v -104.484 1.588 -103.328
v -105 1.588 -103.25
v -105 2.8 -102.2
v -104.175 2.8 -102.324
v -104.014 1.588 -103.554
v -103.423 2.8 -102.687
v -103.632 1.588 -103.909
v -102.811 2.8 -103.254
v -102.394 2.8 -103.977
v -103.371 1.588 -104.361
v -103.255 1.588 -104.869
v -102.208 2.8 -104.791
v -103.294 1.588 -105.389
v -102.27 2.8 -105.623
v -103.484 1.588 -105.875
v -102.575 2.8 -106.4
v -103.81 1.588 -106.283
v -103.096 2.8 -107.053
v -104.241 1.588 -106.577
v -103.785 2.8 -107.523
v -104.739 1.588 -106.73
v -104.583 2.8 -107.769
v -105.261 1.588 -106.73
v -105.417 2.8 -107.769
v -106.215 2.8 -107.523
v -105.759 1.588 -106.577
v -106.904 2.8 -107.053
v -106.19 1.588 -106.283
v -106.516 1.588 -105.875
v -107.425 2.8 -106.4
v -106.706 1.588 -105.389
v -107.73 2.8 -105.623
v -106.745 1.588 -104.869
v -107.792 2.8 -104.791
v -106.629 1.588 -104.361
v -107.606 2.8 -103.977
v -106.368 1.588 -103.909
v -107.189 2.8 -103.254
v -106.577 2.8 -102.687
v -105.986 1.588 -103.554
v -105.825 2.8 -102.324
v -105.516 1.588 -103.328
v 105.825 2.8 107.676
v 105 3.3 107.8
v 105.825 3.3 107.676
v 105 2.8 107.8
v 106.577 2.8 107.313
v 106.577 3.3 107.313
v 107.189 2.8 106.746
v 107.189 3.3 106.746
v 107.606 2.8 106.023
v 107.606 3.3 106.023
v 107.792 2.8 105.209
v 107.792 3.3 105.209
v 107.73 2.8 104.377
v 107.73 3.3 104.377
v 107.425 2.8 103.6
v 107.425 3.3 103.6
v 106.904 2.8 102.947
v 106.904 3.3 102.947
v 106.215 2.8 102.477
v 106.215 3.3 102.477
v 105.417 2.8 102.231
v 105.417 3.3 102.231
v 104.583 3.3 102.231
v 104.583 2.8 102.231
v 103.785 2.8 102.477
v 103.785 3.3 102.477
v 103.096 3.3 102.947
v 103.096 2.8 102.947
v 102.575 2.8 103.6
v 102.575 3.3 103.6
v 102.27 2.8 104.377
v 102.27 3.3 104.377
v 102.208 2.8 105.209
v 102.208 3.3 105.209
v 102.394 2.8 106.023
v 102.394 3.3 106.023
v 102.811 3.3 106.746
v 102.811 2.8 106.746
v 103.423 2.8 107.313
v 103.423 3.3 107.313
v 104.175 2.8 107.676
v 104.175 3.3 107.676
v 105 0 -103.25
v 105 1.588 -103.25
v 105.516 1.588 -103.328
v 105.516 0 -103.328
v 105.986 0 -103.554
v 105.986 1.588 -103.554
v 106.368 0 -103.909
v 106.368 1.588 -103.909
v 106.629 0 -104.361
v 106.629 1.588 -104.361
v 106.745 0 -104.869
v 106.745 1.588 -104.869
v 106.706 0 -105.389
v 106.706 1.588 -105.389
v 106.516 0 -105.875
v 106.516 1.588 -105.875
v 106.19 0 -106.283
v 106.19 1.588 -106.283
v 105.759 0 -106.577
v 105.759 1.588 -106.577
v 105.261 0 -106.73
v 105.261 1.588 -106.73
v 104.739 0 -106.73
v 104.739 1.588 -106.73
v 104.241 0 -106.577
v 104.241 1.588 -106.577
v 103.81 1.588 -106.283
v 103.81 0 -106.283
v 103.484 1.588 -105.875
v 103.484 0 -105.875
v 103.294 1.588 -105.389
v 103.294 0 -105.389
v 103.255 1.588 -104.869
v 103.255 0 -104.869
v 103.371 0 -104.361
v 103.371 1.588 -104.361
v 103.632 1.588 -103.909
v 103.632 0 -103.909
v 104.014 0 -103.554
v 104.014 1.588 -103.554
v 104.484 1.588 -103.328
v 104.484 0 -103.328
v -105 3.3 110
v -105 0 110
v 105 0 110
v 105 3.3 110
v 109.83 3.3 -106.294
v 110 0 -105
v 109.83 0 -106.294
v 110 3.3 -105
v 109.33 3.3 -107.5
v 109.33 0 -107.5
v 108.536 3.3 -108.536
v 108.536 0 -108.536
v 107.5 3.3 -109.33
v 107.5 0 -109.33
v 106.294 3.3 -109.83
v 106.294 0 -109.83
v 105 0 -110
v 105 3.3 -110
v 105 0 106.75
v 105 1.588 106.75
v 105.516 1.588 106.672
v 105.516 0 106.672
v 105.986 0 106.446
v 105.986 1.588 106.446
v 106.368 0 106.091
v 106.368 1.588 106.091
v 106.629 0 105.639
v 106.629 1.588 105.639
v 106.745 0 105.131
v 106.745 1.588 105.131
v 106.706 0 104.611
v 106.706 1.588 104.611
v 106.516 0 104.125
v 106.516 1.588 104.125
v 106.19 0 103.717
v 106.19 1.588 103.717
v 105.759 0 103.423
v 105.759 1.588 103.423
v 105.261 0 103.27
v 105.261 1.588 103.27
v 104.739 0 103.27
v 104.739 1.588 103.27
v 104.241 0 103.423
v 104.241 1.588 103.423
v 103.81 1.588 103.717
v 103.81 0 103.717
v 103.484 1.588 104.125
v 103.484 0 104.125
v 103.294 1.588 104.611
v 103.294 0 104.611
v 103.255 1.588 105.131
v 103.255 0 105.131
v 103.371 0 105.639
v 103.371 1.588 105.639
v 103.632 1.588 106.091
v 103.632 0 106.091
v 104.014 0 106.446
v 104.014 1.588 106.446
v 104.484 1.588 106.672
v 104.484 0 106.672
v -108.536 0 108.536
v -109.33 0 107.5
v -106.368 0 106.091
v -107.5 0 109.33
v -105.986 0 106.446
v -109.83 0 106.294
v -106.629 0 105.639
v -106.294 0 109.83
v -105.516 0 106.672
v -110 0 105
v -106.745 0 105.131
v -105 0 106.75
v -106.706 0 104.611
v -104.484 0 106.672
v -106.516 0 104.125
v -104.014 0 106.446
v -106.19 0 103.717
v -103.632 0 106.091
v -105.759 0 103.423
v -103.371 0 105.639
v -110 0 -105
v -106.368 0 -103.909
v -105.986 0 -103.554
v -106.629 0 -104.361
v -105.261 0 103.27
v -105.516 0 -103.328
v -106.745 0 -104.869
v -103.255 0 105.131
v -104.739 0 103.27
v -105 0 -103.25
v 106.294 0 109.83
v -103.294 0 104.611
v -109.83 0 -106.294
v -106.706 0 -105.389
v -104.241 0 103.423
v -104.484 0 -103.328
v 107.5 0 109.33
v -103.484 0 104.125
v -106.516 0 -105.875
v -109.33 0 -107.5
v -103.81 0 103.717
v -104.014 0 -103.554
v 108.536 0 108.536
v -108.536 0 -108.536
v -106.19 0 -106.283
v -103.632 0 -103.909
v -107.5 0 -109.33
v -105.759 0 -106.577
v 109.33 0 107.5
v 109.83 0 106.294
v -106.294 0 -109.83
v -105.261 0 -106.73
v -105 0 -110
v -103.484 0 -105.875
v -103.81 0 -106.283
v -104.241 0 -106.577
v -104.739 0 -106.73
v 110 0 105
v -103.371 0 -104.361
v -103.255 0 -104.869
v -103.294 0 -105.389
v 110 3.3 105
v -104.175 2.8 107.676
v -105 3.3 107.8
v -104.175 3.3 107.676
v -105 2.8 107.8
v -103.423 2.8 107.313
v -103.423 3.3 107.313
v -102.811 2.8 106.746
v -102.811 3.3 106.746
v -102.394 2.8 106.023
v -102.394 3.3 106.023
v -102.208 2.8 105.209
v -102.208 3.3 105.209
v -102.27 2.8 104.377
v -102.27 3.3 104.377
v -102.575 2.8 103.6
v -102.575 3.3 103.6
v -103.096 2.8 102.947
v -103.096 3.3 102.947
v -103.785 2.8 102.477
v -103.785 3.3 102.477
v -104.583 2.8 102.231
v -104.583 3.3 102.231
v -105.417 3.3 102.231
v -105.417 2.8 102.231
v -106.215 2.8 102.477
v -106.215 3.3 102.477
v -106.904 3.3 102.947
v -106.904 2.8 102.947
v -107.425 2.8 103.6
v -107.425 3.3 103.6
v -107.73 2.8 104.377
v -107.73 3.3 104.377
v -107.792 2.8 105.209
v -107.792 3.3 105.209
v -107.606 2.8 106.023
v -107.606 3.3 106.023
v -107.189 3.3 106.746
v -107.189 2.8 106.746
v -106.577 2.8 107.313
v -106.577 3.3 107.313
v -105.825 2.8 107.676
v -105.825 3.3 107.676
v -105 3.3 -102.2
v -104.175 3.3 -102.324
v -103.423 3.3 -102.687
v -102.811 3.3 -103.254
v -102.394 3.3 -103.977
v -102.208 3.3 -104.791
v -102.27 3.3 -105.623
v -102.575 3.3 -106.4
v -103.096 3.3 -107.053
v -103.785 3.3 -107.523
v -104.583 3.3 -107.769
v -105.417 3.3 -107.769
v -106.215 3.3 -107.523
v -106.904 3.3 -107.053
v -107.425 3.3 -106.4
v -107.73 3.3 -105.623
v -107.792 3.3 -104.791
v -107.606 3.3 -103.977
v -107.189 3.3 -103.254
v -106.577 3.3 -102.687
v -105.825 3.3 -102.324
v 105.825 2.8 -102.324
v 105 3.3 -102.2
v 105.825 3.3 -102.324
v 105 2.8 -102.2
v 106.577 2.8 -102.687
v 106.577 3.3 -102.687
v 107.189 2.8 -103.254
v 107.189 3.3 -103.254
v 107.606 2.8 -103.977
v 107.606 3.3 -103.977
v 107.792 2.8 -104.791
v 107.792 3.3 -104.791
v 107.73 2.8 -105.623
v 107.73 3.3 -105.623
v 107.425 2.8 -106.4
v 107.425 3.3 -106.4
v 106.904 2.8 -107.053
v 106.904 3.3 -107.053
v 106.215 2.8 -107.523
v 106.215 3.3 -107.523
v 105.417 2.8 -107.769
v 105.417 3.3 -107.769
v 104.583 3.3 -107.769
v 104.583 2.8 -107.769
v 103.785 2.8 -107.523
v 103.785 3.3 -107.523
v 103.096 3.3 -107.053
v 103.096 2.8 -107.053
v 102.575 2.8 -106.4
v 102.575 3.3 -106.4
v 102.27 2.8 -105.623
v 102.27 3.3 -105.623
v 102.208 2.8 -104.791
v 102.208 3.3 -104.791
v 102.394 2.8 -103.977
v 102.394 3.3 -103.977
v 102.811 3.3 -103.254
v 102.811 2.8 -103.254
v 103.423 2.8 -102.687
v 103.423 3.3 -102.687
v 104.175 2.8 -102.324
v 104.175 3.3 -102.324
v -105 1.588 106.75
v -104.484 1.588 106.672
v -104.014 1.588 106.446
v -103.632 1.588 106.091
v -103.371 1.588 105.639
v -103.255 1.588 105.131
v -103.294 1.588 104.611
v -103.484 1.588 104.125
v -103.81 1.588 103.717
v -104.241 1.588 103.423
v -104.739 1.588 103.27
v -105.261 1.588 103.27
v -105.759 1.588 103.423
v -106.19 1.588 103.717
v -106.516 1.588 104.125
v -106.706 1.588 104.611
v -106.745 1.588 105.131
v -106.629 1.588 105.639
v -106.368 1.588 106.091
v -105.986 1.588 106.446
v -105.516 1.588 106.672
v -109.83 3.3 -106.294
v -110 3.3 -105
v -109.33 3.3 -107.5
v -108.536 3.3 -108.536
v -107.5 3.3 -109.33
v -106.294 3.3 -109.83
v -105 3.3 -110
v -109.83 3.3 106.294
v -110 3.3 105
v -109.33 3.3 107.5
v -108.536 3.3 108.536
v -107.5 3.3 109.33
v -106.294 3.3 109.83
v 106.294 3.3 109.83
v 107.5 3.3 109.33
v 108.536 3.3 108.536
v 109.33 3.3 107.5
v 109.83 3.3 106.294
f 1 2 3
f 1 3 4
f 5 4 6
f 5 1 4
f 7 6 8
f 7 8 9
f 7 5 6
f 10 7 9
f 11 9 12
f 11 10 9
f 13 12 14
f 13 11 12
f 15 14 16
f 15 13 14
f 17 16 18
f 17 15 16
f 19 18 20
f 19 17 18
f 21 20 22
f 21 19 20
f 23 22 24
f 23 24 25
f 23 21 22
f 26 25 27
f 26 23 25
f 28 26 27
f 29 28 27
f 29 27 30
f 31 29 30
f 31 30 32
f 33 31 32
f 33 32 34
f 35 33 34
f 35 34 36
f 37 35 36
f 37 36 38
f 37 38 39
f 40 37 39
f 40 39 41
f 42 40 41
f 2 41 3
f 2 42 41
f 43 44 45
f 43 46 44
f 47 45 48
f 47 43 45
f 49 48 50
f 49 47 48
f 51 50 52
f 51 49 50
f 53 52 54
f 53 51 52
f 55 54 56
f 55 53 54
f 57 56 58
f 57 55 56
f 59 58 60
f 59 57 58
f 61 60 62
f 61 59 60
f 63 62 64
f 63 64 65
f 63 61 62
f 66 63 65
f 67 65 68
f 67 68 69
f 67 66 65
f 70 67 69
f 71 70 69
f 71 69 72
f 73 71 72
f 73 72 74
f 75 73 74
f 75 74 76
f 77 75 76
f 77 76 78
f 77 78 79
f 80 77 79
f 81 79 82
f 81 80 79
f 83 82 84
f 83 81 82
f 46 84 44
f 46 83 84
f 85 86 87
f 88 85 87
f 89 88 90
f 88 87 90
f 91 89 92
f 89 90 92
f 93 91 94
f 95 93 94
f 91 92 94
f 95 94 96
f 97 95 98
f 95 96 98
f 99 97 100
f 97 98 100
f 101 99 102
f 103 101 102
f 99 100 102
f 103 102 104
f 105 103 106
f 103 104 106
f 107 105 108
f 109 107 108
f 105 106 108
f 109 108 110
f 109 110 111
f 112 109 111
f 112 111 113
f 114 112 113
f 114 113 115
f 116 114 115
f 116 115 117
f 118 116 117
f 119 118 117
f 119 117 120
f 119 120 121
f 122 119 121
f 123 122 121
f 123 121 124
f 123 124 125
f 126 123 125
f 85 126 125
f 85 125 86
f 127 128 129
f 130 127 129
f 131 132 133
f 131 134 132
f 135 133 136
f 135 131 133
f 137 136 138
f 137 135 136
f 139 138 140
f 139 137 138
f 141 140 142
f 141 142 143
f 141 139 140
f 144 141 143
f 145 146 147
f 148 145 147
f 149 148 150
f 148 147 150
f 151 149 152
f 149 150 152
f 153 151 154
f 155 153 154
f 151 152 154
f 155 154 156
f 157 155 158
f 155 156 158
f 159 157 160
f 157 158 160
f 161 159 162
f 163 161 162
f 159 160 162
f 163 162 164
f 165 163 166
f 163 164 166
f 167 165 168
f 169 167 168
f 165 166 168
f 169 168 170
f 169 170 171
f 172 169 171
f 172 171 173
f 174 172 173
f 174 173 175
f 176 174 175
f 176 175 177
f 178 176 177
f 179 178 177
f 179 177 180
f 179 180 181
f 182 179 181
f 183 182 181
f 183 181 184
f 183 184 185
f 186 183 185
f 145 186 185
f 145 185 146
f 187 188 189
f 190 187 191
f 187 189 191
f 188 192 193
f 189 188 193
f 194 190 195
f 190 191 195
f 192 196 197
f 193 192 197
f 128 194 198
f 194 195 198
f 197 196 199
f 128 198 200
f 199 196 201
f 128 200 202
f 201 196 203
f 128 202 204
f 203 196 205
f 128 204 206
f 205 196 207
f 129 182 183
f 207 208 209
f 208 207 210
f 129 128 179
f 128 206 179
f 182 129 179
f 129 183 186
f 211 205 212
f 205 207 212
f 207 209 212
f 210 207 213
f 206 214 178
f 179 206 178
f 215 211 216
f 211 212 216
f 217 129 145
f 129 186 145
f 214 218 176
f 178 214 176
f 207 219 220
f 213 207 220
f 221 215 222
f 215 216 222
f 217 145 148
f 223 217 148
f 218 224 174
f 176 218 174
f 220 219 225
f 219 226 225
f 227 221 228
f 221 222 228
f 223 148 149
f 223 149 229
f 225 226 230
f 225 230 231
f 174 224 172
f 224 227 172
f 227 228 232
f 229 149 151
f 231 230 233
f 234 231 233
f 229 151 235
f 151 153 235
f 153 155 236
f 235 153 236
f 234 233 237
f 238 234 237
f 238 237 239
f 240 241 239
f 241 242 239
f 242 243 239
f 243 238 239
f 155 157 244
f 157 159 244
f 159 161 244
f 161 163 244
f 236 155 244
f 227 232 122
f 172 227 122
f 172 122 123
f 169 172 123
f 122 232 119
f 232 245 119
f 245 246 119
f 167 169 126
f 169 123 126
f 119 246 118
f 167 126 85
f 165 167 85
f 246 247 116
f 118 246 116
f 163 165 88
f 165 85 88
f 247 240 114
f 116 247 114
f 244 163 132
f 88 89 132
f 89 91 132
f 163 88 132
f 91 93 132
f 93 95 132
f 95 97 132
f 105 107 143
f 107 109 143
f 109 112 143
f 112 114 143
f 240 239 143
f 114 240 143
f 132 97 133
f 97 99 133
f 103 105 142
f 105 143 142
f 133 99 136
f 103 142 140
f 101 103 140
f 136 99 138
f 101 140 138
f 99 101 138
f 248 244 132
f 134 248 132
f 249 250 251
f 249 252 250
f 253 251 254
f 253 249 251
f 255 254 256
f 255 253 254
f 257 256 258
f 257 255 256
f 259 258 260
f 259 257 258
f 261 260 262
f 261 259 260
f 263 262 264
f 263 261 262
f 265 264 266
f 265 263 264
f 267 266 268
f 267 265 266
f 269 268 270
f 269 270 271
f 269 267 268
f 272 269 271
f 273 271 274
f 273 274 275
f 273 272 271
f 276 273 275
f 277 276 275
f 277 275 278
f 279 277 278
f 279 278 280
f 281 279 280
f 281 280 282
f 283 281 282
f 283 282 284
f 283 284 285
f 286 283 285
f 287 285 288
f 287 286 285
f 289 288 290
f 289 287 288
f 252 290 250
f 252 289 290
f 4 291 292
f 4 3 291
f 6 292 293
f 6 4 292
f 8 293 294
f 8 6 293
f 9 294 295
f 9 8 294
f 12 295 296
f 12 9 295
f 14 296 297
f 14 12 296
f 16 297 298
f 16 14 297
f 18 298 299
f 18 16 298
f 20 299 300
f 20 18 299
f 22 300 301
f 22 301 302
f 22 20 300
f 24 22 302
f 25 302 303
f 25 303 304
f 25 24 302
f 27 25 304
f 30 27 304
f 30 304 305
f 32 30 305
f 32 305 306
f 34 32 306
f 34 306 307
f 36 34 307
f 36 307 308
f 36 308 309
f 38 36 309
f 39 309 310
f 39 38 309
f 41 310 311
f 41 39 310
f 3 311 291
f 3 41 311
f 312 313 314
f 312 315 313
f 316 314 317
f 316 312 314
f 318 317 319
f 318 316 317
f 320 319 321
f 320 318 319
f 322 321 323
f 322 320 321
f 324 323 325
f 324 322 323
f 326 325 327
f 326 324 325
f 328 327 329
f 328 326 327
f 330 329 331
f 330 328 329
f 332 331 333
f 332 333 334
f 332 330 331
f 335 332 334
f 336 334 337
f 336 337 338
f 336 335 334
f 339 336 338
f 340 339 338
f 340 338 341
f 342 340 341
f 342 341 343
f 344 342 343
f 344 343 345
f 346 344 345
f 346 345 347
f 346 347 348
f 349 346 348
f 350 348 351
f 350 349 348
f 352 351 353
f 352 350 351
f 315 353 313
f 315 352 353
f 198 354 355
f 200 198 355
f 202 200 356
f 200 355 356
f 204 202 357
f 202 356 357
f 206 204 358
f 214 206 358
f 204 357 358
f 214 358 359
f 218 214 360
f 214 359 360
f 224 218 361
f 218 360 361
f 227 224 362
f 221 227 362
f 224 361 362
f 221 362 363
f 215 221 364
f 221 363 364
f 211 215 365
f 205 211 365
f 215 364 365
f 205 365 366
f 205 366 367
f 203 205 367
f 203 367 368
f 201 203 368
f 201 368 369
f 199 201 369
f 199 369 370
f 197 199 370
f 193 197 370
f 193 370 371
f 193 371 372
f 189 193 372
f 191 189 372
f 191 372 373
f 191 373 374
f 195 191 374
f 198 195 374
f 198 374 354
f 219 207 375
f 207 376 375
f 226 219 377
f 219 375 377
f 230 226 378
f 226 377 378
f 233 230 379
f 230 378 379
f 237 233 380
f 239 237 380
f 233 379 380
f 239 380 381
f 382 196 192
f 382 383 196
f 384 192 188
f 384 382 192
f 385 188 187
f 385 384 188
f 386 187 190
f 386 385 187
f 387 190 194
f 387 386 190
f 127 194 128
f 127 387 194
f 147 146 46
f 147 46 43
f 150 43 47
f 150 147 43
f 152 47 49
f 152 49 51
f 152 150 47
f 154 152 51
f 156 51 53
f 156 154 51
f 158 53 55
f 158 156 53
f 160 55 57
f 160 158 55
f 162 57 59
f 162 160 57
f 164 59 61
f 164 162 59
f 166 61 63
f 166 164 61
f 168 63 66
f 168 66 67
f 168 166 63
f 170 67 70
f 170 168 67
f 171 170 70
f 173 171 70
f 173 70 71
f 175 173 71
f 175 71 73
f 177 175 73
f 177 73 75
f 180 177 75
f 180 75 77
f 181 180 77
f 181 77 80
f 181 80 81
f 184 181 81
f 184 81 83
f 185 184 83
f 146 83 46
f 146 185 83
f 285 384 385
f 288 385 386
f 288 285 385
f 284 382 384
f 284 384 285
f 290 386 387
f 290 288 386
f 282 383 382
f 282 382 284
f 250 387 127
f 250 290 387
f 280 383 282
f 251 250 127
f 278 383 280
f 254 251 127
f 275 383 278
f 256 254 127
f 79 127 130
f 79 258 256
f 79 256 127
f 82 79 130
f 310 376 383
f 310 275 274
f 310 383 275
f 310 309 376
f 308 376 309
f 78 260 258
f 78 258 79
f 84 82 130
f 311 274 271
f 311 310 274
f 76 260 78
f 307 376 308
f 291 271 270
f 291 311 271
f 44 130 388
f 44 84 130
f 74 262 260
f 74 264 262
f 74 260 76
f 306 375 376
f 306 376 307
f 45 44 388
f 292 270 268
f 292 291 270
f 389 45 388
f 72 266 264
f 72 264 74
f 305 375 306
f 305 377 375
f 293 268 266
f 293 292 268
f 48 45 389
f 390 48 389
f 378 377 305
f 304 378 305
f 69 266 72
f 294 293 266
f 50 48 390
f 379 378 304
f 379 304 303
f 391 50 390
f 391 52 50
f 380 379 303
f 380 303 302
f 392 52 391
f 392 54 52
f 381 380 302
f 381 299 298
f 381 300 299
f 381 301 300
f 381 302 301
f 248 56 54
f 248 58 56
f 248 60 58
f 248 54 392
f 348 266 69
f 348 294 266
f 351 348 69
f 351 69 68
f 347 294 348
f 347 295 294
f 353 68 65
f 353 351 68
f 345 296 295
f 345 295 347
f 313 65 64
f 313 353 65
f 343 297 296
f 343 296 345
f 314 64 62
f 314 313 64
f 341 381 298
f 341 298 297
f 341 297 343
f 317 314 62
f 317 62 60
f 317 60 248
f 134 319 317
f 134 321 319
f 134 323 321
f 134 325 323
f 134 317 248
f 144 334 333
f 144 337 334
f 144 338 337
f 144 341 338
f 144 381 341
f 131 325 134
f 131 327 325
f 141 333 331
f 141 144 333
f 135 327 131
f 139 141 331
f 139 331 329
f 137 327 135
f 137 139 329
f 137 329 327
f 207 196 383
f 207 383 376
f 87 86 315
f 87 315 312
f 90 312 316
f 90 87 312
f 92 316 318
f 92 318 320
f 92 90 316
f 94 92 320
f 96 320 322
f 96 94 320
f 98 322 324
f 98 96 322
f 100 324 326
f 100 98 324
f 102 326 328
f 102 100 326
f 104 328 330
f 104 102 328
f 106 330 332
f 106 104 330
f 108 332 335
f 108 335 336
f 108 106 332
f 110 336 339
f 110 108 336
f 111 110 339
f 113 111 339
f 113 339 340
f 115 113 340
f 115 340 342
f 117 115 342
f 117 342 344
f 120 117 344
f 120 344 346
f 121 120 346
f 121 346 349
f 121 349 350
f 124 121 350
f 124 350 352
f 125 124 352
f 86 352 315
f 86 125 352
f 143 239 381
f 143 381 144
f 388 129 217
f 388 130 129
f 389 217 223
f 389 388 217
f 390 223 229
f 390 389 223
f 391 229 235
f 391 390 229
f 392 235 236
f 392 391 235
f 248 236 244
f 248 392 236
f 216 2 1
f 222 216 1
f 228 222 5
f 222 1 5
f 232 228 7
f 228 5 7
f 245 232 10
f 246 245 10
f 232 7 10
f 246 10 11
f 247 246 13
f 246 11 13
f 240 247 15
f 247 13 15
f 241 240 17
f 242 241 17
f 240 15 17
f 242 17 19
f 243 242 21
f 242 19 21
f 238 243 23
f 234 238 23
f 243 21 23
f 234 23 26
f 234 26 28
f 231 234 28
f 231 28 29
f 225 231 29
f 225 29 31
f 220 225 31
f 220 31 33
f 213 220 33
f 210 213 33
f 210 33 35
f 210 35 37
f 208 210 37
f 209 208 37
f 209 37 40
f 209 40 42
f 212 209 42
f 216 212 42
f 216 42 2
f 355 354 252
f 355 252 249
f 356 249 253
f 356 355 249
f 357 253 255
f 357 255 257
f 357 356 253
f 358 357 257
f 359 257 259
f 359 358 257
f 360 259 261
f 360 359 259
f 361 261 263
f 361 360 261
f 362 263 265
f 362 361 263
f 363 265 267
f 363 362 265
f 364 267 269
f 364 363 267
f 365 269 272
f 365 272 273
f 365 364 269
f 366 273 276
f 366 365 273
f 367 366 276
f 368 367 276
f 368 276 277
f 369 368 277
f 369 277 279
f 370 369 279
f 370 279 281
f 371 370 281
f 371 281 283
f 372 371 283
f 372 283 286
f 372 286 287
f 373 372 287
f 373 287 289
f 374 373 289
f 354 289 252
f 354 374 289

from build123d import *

# Parameters (mm, degrees)
SKETCH1_W            = 220
SKETCH1_H            = 220
EXTRUDE1_DEPTH       = 3.3
FILLET1_R            = 5
SKETCH2_R            = 1.75
EXTRUDE2_DEPTH       = 3.3
LPATTERN1_COUNT      = 2
LPATTERN1_PITCH      = 210
LPATTERN1_COUNT_DIR2 = 2
LPATTERN1_PITCH_DIR2 = 210


with BuildPart() as part:
    # Sketch1 → Extrude1 (new body)
    with BuildSketch(Plane(origin=(0, 0, 0), x_dir=(1, 0, 0), z_dir=(0, 1, 0))):
        Rectangle(SKETCH1_W, SKETCH1_H)
    extrude(amount=EXTRUDE1_DEPTH)

    # Fillet1
    fillet1_edges = [part.edges().sort_by_distance(p)[0] for p in [
        (-110, 1.65, -110),
        (110, 1.65, -110),
        (110, 1.65, 110),
        (-110, 1.65, 110),
    ]]
    fillet(fillet1_edges, radius=FILLET1_R)

    # Sketch2 → Extrude2 (cut)
    with BuildSketch(Plane(origin=(0, 3.3, 0), x_dir=(1, 0, 0), z_dir=(0, 1, 0))):
        with Locations(Location((-105, 105, 0), (0, 0, 270))):
            Circle(SKETCH2_R)
        with Locations(Location((105, 105, 0), (0, 0, 270))):
            Circle(SKETCH2_R)
        with Locations(Location((-105, -105, 0), (0, 0, 270))):
            Circle(SKETCH2_R)
        with Locations(Location((105, -105, 0), (0, 0, 270))):
            Circle(SKETCH2_R)
    extrude(amount=-EXTRUDE2_DEPTH, mode=Mode.SUBTRACT)

    # Sketch3 → Cut-Revolve1 (revolve, cut)
    with BuildSketch(Plane(origin=(0, 0, -105), x_dir=(-1, 0, 0), z_dir=(0, 0, -1)), mode=Mode.PRIVATE) as cut_revolve1_sk:
        Polygon((105, 3.3), (107.8, 3.3), (107.8, 2.8), (106.5, 1.3), (105, 1.3), align=None)
    cut_revolve1 = revolve(cut_revolve1_sk.sketch.rotate(Axis((-105, 1.3, -105), (0, 1, 0)), 90), axis=Axis((-105, 1.3, -105), (0, 1, 0)), mode=Mode.SUBTRACT)

    # LPattern1: Cut-Revolve1 2 × 2
    with Locations(*[(i * LPATTERN1_PITCH, 0, j * LPATTERN1_PITCH_DIR2) for i in range(LPATTERN1_COUNT) for j in range(LPATTERN1_COUNT_DIR2) if (i, j) != (0, 0)]):
        add(cut_revolve1, mode=Mode.SUBTRACT)


solid = part.part
